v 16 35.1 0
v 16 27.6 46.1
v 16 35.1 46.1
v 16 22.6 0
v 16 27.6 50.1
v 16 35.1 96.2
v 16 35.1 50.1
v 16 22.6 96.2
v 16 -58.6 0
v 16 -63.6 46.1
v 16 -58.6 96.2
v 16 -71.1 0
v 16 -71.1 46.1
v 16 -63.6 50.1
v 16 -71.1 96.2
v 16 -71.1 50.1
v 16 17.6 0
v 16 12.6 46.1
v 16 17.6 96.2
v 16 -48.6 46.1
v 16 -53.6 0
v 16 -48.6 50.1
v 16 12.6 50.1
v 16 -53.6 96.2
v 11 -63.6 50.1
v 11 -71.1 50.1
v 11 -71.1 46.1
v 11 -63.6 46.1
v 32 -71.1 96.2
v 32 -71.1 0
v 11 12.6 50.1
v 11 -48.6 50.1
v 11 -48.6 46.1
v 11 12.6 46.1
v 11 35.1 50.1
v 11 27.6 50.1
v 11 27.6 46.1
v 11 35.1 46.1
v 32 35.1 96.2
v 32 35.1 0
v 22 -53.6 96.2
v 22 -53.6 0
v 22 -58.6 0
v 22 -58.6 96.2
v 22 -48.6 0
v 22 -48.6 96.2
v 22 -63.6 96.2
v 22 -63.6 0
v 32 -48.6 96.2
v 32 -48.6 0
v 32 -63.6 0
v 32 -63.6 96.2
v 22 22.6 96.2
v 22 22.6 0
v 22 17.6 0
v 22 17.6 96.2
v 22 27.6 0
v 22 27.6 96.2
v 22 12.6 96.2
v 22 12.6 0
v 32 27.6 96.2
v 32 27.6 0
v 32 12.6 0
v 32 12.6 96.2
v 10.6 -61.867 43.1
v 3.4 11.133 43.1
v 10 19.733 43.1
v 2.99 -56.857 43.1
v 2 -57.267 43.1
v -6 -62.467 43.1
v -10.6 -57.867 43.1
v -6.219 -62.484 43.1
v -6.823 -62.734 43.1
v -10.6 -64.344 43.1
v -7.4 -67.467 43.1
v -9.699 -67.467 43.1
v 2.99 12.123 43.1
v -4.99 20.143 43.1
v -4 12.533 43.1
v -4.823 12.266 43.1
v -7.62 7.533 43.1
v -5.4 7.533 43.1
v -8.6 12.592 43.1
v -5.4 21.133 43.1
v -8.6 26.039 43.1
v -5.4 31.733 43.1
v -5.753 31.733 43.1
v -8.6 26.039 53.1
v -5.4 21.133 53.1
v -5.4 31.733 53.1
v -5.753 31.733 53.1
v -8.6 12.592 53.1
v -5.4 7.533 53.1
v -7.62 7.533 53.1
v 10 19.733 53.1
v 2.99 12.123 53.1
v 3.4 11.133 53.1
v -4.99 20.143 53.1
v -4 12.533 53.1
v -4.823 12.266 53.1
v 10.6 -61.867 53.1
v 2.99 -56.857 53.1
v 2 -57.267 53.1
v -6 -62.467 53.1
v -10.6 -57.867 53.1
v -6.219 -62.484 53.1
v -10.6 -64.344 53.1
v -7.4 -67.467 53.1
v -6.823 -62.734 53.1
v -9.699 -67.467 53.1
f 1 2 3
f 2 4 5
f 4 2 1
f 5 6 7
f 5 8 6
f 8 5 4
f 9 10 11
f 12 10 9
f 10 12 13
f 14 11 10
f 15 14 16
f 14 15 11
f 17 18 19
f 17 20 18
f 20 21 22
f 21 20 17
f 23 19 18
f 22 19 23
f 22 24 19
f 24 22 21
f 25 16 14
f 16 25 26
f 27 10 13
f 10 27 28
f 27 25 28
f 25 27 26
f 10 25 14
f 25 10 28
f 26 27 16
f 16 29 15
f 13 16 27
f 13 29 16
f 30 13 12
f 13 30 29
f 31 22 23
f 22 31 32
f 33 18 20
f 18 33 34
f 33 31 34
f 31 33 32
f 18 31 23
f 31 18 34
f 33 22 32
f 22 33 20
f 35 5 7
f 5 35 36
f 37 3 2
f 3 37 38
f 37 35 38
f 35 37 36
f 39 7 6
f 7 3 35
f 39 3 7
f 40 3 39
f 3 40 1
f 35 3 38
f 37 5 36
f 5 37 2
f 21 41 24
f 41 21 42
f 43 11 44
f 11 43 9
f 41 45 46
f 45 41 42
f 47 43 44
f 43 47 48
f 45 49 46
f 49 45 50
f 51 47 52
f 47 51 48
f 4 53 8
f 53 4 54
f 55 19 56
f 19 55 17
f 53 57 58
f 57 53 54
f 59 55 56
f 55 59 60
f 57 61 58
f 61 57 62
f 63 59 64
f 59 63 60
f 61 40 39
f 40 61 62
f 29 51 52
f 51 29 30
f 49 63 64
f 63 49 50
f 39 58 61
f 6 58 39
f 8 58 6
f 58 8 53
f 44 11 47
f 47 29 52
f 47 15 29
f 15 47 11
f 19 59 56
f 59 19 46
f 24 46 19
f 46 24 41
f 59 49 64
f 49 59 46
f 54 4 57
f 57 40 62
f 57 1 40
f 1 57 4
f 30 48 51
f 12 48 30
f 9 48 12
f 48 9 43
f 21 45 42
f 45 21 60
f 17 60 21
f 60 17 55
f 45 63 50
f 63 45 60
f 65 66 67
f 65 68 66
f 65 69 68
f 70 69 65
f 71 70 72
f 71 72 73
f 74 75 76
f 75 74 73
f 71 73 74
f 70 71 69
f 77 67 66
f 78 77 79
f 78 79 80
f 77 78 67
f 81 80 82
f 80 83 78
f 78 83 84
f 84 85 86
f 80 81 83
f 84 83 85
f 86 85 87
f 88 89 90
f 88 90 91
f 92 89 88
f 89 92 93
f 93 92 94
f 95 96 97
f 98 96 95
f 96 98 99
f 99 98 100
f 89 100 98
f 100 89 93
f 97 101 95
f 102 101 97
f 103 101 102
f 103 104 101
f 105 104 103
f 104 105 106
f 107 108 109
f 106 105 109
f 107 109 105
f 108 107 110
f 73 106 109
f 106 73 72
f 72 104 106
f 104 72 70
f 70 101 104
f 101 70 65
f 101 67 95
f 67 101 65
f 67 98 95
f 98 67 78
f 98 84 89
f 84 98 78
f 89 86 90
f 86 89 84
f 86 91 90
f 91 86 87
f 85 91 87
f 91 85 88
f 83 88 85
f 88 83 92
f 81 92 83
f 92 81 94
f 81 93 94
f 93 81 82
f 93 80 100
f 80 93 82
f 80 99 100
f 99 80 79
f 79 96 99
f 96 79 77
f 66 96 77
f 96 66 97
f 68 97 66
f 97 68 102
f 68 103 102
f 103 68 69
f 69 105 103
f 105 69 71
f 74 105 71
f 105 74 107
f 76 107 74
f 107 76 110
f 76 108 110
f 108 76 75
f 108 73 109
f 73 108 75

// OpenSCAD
// GearTrack-to-Slatwall Adapter
// Slides into Gladiator GearTrack/GearWall channels and presents
// a standard slatwall panel face with full-width horizontal T-grooves.
//
// Self-contained — no external dependencies.
// GearTrack bracket profile derived from CosmicProphet's GearTrack
// Mounting Brackets (Thingiverse thing:4075984), CC BY 4.0.
// Slatwall groove profile derived from Thingiverse thing:153058 and
// thing:5878930.
//
// Print settings:
//   Orientation: flat on bed (panel face down)
//   Infill: 50-80%, rectilinear
//   Perimeters: 3+
//   Material: PLA or PETG (PETG recommended for garage use)
//   Supports: not required

/* [Slatwall Panel] */

// Panel width in mm (horizontal, along the track). Even column count.
panel_width = 4; // [2, 4, 6, 8]

// Number of slatwall groove rows (vertical, 3" / 76.2mm apart)
groove_rows = 2; // [1:1:4]

/* [Groove Dimensions] */

// Groove opening width in mm (narrow front slit)
groove_opening = 5.0; // [4:0.5:7]

// T-channel width in mm (wider space behind the lip)
groove_channel_w = 15.0; // [12:0.5:18]

// T-channel depth in mm (how deep behind the front face)
groove_channel_d = 10.0; // [8:0.5:14]

// Front face thickness in mm (material in front of T-channel)
face_thick = 6.0; // [4:0.5:8]

/* [Panel Layout] */

// Groove spacing center-to-center in mm (standard = 76.2 / 3 inches)
groove_spacing = 76.2;

// Margin above/below outermost grooves in mm
margin_v = 15.0; // [10:1:25]

// Column spacing for tab distribution (same as pegboard adapter)
col_spacing = 25.4; // 1 inch, for tab placement math

/* [Standoff] */

// Space between GearTrack face and panel back (mm)
standoff = 5.0; // [0:1:15]

// Rib thickness in mm
rib_thick = 4.0; // [3:0.5:6]

// Gusset size in mm
gusset = 7.0; // [4:0.5:12]

/* [Advanced] */

// Tab width in mm (along the track)
tab_width = 10; // [8:1:14]

// Print just one bracket tab to test GearTrack fit
test_clip = false;

/* [Hidden] */

$fn = 40;

// ----- GEARTRACK BRACKET PROFILE -----
_bracket_profile = [
    [  -6.000,  -62.467],
    [  10.600,  -61.867],
    [  10.000,   19.733],
    [  -4.990,   20.143],
    [  -5.400,   21.133],
    [  -5.400,   31.733],
    [  -5.753,   31.733],
    [  -8.600,   26.039],
    [  -8.600,   12.592],
    [  -7.620,    7.533],
    [  -5.400,    7.533],
    [  -4.823,   12.266],
    [  -4.000,   12.533],
    [   2.990,   12.123],
    [   3.400,   11.133],
    [   2.990,  -56.857],
    [   2.000,  -57.267],
    [ -10.600,  -57.867],
    [ -10.600,  -64.344],
    [  -9.699,  -67.467],
    [  -7.400,  -67.467],
    [  -6.823,  -62.734],
    [  -6.219,  -62.484]
];

module bracket_tab() {
    linear_extrude(height = tab_width)
        polygon(points = _bracket_profile);
}

// ----- DERIVED -----
// Total plate thickness = front face + T-channel depth
plate_thick = face_thick + groove_channel_d;

// Panel dimensions
plate_w = (panel_width - 1) * col_spacing + 2 * 10;  // horizontal (along track)
plate_h = (groove_rows - 1) * groove_spacing + 2 * margin_v;  // vertical

// Tab count: 1 per 4 columns of width
num_tabs = max(1, ceil(panel_width / 4));

bracket_height = 100;
bracket_y_min  = -68;
bracket_front  = 11;

num_gaps = panel_width - 1;

function tab_gap_index(i, n, gaps) =
    (n == 1) ? floor(gaps / 2) :
    floor(i * (gaps - 1) / (n - 1));

function gap_z(gap_idx) =
    10 + (gap_idx + 0.5) * col_spacing;

// ----- MODULES -----

// Full-width T-groove cut — extends through panel AND ribs/gussets behind it
// so slatwall hooks can slide freely along the full width
module groove_cut() {
    // Front narrow opening (through the face)
    translate([-1, -groove_opening / 2, -1])
        cube([face_thick + 2, groove_opening, plate_w + 2]);

    // Rear T-channel — extends back through ribs and standoff
    translate([face_thick, -groove_channel_w / 2, -1])
        cube([groove_channel_d + standoff + 20, groove_channel_w, plate_w + 2]);
}

// Slatwall panel (solid block — grooves cut in assembly)
module slatwall_panel() {
    cube([plate_thick, plate_h, plate_w]);
}

// Short rib segment for a solid band between grooves
module rib_segment(seg_h) {
    cube([standoff, seg_h, rib_thick]);
}

module gusset_wedge(leg_x, leg_z, h) {
    polyhedron(
        points = [
            [0, 0, 0], [leg_x, 0, 0], [0, 0, leg_z],
            [0, h, 0], [leg_x, h, 0], [0, h, leg_z]
        ],
        faces = [
            [0, 2, 1], [3, 4, 5],
            [0, 1, 4, 3], [1, 2, 5, 4], [0, 3, 5, 2]
        ]
    );
}

// ----- ASSEMBLY -----

if (test_clip) {
    bracket_tab();
} else {
    plate_y_offset = bracket_y_min + (bracket_height - plate_h) / 2;
    panel_x = bracket_front + standoff;

    // Bracket tabs
    for (i = [0 : num_tabs - 1]) {
        gi = tab_gap_index(i, num_tabs, num_gaps);
        tz = gap_z(gi);
        translate([0, 0, tz - tab_width / 2])
            bracket_tab();
    }

    // Ribs — only in solid bands between grooves (not crossing groove channels)
    // Solid bands: bottom margin, between each groove pair, top margin
    // Groove centers are at: margin_v, margin_v + groove_spacing, ...
    // Groove channel occupies: center - groove_channel_w/2 to center + groove_channel_w/2
    if (standoff > 0) {
        for (i = [0 : num_tabs - 1]) {
            gi = tab_gap_index(i, num_tabs, num_gaps);
            tz = gap_z(gi);

            // Bottom margin band: Y=0 to first groove bottom edge
            bot_band_top = margin_v - groove_channel_w / 2;
            if (bot_band_top > 1)
                translate([bracket_front, plate_y_offset, tz - rib_thick / 2])
                    rib_segment(bot_band_top);

            // Bands between grooves
            for (r = [0 : groove_rows - 2]) {
                band_bot = margin_v + r * groove_spacing + groove_channel_w / 2;
                band_top = margin_v + (r + 1) * groove_spacing - groove_channel_w / 2;
                band_h = band_top - band_bot;
                if (band_h > 1)
                    translate([bracket_front, plate_y_offset + band_bot, tz - rib_thick / 2])
                        rib_segment(band_h);
            }

            // Top margin band: last groove top edge to plate_h
            top_band_bot = margin_v + (groove_rows - 1) * groove_spacing + groove_channel_w / 2;
            top_band_h = plate_h - top_band_bot;
            if (top_band_h > 1)
                translate([bracket_front, plate_y_offset + top_band_bot, tz - rib_thick / 2])
                    rib_segment(top_band_h);
        }
    }

    // Slatwall panel with grooves cut
    difference() {
        translate([panel_x, plate_y_offset, 0])
            slatwall_panel();

        for (r = [0 : groove_rows - 1]) {
            translate([panel_x, plate_y_offset + margin_v + r * groove_spacing, 0])
                groove_cut();
        }
    }
}
